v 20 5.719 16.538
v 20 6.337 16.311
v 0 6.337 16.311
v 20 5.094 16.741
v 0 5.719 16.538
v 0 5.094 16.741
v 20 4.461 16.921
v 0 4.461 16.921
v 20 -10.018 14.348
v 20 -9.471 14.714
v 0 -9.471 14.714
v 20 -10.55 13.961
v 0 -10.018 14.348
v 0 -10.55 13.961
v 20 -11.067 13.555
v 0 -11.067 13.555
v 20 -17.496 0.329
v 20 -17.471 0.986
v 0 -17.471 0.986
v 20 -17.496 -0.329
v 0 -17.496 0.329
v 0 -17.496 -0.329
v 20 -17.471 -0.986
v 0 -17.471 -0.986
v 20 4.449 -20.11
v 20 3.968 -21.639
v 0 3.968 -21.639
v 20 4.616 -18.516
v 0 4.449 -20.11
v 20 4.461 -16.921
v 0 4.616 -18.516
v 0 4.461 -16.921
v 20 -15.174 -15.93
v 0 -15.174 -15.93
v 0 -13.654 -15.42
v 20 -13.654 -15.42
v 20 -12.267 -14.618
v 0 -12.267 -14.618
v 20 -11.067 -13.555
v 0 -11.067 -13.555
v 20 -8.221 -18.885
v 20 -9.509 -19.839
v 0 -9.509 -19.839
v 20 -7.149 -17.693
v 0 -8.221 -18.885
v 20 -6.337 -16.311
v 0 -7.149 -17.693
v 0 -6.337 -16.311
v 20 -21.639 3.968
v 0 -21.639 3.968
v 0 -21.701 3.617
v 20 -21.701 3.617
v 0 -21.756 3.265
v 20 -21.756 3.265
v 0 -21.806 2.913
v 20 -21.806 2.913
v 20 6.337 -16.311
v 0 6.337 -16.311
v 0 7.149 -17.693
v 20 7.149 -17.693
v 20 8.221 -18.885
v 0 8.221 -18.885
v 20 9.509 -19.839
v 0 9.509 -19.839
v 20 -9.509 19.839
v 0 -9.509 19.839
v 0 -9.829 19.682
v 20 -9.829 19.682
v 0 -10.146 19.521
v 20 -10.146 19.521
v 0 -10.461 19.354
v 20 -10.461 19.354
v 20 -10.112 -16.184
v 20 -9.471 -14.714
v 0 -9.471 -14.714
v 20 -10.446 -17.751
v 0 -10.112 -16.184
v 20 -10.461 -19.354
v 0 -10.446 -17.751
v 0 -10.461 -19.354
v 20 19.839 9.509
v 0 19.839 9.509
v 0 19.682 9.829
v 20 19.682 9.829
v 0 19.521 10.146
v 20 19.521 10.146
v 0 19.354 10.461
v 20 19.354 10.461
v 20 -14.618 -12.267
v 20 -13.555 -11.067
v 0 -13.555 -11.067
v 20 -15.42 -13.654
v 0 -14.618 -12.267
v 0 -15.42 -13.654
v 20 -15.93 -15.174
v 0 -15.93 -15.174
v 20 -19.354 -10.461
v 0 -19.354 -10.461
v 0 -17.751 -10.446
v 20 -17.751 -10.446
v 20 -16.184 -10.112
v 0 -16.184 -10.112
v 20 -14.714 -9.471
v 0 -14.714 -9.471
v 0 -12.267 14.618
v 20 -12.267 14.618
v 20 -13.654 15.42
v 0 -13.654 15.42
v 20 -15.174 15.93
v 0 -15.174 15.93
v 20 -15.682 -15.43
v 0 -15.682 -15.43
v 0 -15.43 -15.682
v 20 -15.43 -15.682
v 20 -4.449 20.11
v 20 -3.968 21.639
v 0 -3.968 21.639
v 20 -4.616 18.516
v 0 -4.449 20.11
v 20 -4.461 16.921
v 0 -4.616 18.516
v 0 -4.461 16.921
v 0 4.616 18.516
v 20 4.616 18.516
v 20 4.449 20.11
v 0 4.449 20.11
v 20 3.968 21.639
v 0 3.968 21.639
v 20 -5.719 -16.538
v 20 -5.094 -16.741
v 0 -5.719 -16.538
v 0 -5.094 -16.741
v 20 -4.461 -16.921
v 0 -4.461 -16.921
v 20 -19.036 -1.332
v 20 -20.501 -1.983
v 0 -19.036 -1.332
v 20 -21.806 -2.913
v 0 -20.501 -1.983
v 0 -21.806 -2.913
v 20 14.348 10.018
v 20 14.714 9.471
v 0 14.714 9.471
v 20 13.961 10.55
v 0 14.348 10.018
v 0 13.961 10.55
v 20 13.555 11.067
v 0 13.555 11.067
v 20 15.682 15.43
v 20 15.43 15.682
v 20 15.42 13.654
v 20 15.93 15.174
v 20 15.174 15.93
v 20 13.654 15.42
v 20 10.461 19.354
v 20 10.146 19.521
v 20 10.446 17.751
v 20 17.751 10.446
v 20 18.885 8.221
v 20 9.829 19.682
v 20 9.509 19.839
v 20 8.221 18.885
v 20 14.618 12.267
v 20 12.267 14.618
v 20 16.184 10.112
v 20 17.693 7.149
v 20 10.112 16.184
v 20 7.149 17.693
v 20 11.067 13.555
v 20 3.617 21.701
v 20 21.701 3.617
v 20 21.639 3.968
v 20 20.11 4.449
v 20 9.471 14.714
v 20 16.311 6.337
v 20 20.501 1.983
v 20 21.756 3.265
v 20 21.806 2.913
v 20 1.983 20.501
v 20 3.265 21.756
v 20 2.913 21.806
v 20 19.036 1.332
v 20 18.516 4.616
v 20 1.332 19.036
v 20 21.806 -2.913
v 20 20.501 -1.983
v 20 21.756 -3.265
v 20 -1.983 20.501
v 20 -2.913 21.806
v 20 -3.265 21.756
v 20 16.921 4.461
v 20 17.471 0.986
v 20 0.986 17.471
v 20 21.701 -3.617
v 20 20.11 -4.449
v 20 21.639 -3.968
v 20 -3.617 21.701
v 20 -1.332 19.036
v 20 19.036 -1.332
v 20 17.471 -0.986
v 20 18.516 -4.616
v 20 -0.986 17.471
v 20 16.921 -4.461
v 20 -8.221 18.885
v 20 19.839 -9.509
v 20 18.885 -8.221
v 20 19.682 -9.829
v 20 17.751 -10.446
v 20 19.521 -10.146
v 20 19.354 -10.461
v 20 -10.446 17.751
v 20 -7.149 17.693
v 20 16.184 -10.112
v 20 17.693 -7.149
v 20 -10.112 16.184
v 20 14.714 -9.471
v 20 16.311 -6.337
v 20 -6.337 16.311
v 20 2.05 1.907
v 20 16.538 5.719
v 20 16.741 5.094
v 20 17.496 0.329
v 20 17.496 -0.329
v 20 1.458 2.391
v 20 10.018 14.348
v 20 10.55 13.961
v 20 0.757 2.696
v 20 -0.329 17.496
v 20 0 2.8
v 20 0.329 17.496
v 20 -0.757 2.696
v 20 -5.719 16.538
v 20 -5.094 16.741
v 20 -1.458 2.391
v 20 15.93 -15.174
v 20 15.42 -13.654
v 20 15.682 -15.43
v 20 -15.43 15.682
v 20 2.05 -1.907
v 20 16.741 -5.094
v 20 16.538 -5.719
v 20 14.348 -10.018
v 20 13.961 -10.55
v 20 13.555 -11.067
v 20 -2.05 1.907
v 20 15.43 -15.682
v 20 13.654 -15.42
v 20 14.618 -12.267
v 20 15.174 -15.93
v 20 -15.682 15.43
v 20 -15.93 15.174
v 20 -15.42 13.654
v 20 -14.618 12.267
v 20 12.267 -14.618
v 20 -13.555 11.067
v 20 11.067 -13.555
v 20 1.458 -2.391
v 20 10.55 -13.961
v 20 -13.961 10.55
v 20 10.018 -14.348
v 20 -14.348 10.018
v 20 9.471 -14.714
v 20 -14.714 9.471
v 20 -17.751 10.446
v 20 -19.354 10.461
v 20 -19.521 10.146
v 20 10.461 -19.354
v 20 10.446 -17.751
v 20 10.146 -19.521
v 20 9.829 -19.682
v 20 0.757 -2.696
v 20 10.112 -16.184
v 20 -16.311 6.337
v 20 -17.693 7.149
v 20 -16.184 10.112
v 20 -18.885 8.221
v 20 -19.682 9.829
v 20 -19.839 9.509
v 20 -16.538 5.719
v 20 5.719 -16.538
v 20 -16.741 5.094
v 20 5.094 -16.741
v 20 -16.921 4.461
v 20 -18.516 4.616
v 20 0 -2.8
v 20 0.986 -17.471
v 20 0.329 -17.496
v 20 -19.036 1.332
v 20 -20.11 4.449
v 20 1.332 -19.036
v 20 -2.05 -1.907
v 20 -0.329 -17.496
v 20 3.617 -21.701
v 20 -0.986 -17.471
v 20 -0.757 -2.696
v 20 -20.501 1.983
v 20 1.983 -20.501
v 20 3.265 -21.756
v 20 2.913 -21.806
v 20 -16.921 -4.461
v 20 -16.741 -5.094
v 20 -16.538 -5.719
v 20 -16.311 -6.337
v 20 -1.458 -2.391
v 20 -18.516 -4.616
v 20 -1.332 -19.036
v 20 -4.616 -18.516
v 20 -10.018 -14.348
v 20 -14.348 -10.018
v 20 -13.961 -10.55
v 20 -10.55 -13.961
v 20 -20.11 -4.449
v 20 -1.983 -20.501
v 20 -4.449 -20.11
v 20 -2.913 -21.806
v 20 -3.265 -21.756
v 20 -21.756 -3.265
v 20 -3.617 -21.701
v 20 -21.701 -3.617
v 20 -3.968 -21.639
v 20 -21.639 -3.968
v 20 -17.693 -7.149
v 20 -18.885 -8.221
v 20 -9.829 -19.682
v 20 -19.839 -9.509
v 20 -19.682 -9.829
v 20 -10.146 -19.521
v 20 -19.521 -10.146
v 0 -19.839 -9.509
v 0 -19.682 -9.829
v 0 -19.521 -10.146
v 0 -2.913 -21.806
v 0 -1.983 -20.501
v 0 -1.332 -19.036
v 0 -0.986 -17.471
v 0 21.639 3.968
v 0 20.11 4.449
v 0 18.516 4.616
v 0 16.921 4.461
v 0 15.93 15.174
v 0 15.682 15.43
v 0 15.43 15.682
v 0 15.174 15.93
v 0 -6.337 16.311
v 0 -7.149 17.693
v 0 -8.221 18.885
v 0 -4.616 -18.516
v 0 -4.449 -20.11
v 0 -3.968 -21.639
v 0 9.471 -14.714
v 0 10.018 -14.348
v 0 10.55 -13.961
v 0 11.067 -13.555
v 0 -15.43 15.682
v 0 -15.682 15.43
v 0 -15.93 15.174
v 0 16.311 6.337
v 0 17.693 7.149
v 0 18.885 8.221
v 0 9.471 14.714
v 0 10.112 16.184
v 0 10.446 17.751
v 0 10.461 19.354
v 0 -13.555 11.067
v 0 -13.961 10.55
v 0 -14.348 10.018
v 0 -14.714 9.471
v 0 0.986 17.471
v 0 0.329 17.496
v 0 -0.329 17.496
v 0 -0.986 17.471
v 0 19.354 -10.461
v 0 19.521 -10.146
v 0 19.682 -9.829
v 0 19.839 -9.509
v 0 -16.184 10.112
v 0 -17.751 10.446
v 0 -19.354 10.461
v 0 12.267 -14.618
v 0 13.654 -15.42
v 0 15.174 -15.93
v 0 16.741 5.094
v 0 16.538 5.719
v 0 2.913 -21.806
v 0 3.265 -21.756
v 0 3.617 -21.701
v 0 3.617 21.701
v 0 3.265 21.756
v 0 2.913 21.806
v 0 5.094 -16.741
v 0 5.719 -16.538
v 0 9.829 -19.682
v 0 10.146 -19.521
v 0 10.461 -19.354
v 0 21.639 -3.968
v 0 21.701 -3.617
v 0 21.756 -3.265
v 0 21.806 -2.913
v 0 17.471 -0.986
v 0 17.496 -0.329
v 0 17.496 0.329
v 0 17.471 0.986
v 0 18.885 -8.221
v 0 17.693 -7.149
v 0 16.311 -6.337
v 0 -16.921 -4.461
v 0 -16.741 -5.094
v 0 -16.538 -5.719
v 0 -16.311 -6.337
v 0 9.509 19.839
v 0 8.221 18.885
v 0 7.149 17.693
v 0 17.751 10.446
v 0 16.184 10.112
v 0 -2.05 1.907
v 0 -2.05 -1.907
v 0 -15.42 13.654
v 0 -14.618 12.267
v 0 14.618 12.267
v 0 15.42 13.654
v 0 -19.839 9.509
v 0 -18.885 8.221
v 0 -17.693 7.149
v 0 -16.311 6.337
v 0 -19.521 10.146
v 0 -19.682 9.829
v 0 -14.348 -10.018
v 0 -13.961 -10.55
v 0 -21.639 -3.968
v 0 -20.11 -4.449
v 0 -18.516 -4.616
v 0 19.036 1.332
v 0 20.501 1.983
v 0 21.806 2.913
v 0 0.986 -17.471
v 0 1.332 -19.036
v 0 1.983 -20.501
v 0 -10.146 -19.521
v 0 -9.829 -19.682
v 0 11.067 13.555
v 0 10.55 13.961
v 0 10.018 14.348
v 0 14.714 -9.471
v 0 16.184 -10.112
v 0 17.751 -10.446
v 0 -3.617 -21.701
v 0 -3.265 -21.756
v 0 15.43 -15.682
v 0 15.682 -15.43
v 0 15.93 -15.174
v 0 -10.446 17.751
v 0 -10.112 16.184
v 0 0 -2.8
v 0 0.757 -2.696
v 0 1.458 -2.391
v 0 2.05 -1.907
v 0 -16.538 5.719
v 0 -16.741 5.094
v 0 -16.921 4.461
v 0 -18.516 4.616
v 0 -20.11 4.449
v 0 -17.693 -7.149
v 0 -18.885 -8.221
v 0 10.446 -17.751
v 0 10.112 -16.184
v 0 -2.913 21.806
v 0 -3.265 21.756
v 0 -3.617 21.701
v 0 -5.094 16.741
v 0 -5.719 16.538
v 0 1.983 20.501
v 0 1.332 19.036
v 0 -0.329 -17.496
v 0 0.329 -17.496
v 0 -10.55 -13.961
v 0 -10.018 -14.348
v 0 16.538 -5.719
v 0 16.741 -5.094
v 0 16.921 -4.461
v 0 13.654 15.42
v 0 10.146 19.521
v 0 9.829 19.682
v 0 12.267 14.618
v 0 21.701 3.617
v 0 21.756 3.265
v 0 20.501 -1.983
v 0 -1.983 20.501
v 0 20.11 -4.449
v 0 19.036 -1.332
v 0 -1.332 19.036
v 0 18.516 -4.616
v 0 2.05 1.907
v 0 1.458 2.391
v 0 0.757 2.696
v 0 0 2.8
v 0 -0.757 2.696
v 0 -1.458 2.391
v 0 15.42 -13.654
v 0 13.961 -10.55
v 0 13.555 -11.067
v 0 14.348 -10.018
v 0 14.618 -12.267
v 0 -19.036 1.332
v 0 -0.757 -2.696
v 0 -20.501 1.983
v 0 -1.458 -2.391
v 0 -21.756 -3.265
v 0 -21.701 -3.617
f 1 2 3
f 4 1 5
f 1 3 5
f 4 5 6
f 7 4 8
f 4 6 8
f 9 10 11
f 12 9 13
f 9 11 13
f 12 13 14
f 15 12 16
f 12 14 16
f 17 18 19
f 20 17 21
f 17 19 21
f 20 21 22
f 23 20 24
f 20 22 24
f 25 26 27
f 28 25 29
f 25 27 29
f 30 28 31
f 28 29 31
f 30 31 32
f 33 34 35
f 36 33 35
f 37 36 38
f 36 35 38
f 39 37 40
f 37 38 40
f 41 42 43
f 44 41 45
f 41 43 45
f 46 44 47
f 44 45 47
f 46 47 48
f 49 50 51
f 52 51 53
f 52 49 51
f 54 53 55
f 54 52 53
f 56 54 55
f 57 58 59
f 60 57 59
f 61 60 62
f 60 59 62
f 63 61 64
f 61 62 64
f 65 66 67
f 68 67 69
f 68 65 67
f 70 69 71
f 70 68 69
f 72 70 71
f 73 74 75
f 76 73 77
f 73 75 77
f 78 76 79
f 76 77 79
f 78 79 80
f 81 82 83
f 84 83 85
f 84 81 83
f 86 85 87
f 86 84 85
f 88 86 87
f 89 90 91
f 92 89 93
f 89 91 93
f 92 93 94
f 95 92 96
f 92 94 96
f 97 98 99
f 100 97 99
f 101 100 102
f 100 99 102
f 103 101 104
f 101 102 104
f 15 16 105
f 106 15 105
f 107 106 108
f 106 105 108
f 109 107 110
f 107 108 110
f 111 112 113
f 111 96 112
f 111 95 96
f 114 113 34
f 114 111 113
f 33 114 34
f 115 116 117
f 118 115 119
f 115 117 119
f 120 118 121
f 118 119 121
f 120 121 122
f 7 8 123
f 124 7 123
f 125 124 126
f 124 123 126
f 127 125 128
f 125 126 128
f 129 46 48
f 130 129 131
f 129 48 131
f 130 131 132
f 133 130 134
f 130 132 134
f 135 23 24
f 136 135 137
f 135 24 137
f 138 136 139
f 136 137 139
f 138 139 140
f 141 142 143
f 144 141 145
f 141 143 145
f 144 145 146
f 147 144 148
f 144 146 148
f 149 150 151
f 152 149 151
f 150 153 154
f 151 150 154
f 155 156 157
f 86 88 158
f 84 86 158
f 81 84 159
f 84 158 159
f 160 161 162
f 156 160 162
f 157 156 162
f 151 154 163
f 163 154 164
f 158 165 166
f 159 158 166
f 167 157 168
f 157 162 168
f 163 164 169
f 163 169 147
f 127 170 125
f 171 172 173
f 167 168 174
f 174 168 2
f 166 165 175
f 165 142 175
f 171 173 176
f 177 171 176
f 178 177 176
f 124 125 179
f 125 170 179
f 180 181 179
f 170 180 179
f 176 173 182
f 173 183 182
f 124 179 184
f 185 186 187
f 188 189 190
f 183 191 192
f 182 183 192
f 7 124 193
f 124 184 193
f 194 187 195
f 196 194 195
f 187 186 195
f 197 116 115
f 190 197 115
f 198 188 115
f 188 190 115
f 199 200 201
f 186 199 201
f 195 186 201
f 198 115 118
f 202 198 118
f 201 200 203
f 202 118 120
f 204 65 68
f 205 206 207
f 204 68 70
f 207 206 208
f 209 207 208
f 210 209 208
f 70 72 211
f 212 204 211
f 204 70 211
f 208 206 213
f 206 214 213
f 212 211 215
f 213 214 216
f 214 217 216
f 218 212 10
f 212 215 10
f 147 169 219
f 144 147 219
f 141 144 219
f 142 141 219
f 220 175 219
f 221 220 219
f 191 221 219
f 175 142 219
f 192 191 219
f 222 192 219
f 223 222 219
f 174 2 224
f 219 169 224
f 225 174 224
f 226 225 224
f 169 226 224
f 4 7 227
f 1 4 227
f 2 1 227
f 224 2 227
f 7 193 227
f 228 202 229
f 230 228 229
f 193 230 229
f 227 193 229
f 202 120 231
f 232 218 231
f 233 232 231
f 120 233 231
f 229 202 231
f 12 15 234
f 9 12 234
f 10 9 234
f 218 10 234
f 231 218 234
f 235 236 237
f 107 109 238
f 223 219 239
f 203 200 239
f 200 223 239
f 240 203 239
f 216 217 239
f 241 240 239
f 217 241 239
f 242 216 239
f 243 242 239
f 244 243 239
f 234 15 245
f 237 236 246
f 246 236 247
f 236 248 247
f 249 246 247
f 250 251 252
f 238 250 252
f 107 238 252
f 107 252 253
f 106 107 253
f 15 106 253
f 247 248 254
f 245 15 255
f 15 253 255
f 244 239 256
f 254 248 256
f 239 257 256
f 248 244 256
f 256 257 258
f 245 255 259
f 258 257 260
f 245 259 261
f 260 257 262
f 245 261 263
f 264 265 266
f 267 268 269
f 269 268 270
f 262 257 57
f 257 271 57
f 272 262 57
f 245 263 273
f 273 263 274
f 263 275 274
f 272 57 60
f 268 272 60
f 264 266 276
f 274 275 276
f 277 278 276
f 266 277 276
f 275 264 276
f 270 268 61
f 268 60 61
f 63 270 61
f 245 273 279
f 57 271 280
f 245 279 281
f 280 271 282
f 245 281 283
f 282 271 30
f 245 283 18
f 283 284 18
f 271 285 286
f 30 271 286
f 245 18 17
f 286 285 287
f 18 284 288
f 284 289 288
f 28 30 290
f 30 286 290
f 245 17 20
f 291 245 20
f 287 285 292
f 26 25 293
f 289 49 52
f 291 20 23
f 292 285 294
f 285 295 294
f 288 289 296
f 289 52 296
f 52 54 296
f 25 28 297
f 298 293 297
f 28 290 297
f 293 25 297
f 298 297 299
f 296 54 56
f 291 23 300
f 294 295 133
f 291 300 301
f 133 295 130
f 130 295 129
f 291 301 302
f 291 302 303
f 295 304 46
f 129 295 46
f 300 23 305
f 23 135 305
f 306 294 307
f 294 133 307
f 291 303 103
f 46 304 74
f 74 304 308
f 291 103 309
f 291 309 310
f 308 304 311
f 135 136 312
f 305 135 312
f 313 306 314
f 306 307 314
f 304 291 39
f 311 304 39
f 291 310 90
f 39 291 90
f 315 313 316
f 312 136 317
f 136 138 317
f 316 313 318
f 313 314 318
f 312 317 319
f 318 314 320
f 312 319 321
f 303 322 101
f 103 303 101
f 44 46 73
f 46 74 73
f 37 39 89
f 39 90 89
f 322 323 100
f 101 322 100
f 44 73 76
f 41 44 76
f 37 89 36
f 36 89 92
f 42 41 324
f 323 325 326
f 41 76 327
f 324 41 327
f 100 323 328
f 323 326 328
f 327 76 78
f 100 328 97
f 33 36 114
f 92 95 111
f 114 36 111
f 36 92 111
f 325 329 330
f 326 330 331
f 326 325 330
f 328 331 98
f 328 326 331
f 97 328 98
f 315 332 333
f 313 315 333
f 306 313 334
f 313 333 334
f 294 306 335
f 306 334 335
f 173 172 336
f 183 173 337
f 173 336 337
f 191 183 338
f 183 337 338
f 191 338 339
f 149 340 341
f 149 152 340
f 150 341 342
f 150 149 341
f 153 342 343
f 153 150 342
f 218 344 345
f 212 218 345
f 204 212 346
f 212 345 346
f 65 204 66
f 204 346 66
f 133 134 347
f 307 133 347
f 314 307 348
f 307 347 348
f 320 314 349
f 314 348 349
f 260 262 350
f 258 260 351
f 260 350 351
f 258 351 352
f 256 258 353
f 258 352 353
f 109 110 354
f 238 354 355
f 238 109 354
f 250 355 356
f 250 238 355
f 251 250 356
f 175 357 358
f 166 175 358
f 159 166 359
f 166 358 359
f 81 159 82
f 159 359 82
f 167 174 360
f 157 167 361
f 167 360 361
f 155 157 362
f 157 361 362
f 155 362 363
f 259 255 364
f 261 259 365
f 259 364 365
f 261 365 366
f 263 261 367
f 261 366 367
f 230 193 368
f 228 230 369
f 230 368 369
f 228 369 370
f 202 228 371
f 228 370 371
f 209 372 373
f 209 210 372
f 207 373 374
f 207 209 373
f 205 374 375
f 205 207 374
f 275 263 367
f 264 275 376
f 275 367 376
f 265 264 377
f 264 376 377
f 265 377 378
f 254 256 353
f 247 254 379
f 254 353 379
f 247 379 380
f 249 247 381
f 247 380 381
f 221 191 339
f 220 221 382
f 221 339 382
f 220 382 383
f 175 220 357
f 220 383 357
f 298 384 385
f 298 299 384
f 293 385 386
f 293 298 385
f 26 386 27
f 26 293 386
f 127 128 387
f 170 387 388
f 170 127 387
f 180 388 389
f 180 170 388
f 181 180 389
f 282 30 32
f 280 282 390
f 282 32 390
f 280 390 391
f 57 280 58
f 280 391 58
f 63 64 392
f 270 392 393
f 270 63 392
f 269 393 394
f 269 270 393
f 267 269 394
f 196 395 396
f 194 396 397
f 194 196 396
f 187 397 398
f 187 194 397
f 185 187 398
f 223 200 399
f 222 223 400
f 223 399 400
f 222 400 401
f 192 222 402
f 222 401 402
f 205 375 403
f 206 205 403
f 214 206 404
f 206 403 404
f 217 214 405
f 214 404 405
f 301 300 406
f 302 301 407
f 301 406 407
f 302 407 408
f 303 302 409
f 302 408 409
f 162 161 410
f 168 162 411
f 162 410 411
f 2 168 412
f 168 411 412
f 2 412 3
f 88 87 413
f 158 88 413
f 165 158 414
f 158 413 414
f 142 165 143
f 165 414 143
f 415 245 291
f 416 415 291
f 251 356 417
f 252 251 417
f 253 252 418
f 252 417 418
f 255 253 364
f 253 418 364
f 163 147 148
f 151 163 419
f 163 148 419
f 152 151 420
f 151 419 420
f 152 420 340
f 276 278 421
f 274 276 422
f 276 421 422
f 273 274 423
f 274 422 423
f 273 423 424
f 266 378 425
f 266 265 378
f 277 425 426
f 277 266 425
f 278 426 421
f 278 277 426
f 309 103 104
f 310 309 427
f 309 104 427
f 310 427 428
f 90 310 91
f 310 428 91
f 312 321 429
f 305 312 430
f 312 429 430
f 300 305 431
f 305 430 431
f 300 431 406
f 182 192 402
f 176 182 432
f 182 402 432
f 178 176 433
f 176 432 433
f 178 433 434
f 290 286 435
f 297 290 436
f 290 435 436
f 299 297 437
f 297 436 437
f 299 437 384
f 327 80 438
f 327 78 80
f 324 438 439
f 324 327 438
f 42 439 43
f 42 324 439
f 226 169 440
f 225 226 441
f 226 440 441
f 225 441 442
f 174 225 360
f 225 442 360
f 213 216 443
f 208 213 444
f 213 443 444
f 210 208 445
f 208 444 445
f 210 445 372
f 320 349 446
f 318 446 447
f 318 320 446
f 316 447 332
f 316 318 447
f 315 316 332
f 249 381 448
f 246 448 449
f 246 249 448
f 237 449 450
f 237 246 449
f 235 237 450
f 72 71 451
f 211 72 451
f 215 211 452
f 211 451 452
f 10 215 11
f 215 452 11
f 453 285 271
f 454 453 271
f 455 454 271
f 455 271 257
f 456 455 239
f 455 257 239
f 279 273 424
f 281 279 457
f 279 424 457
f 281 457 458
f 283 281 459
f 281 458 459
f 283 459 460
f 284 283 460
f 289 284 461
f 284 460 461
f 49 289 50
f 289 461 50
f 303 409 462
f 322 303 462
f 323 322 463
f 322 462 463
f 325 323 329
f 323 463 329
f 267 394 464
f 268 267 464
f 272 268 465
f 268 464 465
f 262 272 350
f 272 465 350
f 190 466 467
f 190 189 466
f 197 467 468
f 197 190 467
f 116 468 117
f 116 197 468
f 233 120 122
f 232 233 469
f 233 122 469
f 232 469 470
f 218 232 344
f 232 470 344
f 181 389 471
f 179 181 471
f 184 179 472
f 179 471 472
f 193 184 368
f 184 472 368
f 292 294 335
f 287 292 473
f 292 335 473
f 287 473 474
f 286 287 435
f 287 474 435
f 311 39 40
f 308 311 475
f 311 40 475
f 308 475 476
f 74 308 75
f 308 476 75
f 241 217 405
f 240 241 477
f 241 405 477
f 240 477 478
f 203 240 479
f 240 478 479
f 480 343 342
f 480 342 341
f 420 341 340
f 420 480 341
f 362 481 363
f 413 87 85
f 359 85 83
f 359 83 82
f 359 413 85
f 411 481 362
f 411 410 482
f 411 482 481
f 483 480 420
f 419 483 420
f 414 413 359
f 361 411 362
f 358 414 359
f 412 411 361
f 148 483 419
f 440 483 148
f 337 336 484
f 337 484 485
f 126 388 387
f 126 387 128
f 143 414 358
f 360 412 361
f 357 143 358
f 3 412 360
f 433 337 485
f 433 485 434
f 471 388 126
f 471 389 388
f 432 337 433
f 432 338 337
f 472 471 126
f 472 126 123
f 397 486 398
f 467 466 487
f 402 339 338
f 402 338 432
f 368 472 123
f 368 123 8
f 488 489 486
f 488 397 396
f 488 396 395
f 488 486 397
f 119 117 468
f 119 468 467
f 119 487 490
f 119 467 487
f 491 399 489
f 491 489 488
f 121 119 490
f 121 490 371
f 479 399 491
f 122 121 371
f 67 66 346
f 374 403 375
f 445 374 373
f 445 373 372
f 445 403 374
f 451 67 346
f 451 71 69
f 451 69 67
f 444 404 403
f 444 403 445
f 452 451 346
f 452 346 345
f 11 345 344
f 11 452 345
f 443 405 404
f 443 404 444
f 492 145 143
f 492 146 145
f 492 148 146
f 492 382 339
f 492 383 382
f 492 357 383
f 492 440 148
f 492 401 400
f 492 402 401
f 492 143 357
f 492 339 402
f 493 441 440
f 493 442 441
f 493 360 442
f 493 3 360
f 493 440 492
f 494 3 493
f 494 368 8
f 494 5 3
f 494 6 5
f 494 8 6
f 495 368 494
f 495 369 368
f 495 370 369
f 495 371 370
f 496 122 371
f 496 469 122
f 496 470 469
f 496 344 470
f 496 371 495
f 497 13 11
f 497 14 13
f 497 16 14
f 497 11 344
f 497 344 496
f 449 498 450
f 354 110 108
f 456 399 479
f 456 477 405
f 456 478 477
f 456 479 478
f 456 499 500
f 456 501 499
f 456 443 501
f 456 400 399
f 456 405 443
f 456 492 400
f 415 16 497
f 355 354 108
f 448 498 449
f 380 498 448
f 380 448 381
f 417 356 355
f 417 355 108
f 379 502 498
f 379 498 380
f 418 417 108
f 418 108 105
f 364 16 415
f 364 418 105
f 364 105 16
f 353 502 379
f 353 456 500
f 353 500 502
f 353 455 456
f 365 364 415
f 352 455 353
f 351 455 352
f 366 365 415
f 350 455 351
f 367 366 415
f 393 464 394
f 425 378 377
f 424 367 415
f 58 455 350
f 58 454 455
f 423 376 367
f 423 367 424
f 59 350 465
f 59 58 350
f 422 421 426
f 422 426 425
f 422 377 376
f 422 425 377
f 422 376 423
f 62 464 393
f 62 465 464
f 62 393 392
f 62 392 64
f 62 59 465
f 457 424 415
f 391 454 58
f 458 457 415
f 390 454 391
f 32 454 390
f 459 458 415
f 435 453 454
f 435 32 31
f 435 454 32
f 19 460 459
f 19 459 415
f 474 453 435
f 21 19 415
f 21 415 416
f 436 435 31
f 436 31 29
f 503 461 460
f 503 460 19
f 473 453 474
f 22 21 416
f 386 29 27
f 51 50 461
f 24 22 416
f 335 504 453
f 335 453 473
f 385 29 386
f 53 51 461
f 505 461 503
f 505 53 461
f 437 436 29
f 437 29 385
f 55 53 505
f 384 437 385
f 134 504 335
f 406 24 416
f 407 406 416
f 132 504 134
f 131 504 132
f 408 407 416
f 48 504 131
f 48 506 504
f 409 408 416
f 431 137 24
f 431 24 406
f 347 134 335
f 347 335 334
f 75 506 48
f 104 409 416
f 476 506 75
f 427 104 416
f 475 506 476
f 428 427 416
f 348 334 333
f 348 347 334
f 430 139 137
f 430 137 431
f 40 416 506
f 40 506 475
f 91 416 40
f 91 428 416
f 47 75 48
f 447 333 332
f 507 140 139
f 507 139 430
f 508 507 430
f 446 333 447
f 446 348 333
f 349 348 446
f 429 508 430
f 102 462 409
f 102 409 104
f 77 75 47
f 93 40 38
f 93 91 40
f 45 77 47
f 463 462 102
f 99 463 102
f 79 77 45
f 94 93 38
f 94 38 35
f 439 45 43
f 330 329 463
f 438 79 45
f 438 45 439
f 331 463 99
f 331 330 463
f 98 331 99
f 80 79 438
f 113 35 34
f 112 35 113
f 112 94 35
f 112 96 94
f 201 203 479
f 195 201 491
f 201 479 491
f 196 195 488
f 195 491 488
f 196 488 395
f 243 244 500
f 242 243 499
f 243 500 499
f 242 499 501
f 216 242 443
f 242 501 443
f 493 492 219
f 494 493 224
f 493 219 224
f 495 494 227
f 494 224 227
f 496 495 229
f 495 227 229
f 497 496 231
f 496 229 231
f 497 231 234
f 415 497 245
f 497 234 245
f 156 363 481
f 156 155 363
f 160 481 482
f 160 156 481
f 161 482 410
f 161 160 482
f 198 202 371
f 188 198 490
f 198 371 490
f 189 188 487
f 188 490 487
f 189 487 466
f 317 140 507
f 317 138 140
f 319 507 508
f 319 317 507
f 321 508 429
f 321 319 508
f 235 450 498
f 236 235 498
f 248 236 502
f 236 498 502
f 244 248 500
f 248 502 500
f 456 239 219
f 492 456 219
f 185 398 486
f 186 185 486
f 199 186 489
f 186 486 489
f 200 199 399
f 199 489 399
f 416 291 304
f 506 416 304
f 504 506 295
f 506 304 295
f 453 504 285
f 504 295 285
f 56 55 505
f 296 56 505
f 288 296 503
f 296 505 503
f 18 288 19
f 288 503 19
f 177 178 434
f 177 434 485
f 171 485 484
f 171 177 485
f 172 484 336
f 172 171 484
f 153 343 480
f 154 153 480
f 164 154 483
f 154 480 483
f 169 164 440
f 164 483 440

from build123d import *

# Parameters (mm, degrees)
BASPROSKE_W        = 20
BASPROSKE_H        = 22
TOOTHCUT_DEPTH     = 37.986484018
TEETHCUTS_COUNT    = 20
TEETHCUTS_ANGLE    = 342
CUT_EXTRUDE1_DEPTH = 37.75639264


with BuildPart() as part:
    # BasProSke → Base-Revolve (revolve)
    with BuildSketch(Plane(origin=(0, 0, 0), x_dir=(1, 0, 0), z_dir=(0, 1, 0)), mode=Mode.PRIVATE) as base_revolve_sk:
        with Locations((10, 11)):
            Rectangle(BASPROSKE_W, BASPROSKE_H)
    revolve(base_revolve_sk.sketch.rotate(Axis((-10, 0, 0), (1, 0, 0)), 180), axis=Axis((-10, 0, 0), (1, 0, 0)))

    # TooCutSke → ToothCut (cut, through all)
    with BuildSketch(Plane(origin=(0, 0, 0), x_dir=(0, 0, -1), z_dir=(1, 0, 0))):
        with BuildLine():
            ThreePointArc((0.986171591, 17.471189616), (0, 17.499), (-0.986171591, 17.471189616))
            ThreePointArc((-0.986171591, 17.471189616), (-1.626916196, 19.798789858), (-2.932850173, 21.829260982))
            ThreePointArc((-2.932850173, 21.829260982), (0, 22.0254), (2.932850173, 21.829260982))
            ThreePointArc((2.932850173, 21.829260982), (1.626916196, 19.798789858), (0.986171591, 17.471189616))
        make_face()
    toothcut = extrude(amount=TOOTHCUT_DEPTH, mode=Mode.SUBTRACT)

    # TeethCuts: ToothCut ×20 about axis
    teethcuts_axis = Axis((-10, 0, 0), (1, 0, 0))
    for i in range(1, TEETHCUTS_COUNT):
        add(toothcut.rotate(teethcuts_axis, i * TEETHCUTS_ANGLE / (TEETHCUTS_COUNT - 1)), mode=Mode.SUBTRACT)

    # Sketch1 → Cut-Extrude1 (cut, through all)
    with BuildSketch(Plane(origin=(20, 0, 0), x_dir=(0, 0, -1), z_dir=(1, 0, 0))):
        with BuildLine():
            Line((1.907223112, 2.05), (-1.907223112, 2.05))
            ThreePointArc((-1.907223112, 2.05), (-2.8, 0), (-1.907223112, -2.05))
            Line((-1.907223112, -2.05), (1.907223112, -2.05))
            ThreePointArc((1.907223112, -2.05), (2.567121415, -1.11798374), (2.8, 0))
            ThreePointArc((2.8, 0), (2.567121415, 1.11798374), (1.907223112, 2.05))
        make_face()
    extrude(amount=-CUT_EXTRUDE1_DEPTH, mode=Mode.SUBTRACT)


solid = part.part
